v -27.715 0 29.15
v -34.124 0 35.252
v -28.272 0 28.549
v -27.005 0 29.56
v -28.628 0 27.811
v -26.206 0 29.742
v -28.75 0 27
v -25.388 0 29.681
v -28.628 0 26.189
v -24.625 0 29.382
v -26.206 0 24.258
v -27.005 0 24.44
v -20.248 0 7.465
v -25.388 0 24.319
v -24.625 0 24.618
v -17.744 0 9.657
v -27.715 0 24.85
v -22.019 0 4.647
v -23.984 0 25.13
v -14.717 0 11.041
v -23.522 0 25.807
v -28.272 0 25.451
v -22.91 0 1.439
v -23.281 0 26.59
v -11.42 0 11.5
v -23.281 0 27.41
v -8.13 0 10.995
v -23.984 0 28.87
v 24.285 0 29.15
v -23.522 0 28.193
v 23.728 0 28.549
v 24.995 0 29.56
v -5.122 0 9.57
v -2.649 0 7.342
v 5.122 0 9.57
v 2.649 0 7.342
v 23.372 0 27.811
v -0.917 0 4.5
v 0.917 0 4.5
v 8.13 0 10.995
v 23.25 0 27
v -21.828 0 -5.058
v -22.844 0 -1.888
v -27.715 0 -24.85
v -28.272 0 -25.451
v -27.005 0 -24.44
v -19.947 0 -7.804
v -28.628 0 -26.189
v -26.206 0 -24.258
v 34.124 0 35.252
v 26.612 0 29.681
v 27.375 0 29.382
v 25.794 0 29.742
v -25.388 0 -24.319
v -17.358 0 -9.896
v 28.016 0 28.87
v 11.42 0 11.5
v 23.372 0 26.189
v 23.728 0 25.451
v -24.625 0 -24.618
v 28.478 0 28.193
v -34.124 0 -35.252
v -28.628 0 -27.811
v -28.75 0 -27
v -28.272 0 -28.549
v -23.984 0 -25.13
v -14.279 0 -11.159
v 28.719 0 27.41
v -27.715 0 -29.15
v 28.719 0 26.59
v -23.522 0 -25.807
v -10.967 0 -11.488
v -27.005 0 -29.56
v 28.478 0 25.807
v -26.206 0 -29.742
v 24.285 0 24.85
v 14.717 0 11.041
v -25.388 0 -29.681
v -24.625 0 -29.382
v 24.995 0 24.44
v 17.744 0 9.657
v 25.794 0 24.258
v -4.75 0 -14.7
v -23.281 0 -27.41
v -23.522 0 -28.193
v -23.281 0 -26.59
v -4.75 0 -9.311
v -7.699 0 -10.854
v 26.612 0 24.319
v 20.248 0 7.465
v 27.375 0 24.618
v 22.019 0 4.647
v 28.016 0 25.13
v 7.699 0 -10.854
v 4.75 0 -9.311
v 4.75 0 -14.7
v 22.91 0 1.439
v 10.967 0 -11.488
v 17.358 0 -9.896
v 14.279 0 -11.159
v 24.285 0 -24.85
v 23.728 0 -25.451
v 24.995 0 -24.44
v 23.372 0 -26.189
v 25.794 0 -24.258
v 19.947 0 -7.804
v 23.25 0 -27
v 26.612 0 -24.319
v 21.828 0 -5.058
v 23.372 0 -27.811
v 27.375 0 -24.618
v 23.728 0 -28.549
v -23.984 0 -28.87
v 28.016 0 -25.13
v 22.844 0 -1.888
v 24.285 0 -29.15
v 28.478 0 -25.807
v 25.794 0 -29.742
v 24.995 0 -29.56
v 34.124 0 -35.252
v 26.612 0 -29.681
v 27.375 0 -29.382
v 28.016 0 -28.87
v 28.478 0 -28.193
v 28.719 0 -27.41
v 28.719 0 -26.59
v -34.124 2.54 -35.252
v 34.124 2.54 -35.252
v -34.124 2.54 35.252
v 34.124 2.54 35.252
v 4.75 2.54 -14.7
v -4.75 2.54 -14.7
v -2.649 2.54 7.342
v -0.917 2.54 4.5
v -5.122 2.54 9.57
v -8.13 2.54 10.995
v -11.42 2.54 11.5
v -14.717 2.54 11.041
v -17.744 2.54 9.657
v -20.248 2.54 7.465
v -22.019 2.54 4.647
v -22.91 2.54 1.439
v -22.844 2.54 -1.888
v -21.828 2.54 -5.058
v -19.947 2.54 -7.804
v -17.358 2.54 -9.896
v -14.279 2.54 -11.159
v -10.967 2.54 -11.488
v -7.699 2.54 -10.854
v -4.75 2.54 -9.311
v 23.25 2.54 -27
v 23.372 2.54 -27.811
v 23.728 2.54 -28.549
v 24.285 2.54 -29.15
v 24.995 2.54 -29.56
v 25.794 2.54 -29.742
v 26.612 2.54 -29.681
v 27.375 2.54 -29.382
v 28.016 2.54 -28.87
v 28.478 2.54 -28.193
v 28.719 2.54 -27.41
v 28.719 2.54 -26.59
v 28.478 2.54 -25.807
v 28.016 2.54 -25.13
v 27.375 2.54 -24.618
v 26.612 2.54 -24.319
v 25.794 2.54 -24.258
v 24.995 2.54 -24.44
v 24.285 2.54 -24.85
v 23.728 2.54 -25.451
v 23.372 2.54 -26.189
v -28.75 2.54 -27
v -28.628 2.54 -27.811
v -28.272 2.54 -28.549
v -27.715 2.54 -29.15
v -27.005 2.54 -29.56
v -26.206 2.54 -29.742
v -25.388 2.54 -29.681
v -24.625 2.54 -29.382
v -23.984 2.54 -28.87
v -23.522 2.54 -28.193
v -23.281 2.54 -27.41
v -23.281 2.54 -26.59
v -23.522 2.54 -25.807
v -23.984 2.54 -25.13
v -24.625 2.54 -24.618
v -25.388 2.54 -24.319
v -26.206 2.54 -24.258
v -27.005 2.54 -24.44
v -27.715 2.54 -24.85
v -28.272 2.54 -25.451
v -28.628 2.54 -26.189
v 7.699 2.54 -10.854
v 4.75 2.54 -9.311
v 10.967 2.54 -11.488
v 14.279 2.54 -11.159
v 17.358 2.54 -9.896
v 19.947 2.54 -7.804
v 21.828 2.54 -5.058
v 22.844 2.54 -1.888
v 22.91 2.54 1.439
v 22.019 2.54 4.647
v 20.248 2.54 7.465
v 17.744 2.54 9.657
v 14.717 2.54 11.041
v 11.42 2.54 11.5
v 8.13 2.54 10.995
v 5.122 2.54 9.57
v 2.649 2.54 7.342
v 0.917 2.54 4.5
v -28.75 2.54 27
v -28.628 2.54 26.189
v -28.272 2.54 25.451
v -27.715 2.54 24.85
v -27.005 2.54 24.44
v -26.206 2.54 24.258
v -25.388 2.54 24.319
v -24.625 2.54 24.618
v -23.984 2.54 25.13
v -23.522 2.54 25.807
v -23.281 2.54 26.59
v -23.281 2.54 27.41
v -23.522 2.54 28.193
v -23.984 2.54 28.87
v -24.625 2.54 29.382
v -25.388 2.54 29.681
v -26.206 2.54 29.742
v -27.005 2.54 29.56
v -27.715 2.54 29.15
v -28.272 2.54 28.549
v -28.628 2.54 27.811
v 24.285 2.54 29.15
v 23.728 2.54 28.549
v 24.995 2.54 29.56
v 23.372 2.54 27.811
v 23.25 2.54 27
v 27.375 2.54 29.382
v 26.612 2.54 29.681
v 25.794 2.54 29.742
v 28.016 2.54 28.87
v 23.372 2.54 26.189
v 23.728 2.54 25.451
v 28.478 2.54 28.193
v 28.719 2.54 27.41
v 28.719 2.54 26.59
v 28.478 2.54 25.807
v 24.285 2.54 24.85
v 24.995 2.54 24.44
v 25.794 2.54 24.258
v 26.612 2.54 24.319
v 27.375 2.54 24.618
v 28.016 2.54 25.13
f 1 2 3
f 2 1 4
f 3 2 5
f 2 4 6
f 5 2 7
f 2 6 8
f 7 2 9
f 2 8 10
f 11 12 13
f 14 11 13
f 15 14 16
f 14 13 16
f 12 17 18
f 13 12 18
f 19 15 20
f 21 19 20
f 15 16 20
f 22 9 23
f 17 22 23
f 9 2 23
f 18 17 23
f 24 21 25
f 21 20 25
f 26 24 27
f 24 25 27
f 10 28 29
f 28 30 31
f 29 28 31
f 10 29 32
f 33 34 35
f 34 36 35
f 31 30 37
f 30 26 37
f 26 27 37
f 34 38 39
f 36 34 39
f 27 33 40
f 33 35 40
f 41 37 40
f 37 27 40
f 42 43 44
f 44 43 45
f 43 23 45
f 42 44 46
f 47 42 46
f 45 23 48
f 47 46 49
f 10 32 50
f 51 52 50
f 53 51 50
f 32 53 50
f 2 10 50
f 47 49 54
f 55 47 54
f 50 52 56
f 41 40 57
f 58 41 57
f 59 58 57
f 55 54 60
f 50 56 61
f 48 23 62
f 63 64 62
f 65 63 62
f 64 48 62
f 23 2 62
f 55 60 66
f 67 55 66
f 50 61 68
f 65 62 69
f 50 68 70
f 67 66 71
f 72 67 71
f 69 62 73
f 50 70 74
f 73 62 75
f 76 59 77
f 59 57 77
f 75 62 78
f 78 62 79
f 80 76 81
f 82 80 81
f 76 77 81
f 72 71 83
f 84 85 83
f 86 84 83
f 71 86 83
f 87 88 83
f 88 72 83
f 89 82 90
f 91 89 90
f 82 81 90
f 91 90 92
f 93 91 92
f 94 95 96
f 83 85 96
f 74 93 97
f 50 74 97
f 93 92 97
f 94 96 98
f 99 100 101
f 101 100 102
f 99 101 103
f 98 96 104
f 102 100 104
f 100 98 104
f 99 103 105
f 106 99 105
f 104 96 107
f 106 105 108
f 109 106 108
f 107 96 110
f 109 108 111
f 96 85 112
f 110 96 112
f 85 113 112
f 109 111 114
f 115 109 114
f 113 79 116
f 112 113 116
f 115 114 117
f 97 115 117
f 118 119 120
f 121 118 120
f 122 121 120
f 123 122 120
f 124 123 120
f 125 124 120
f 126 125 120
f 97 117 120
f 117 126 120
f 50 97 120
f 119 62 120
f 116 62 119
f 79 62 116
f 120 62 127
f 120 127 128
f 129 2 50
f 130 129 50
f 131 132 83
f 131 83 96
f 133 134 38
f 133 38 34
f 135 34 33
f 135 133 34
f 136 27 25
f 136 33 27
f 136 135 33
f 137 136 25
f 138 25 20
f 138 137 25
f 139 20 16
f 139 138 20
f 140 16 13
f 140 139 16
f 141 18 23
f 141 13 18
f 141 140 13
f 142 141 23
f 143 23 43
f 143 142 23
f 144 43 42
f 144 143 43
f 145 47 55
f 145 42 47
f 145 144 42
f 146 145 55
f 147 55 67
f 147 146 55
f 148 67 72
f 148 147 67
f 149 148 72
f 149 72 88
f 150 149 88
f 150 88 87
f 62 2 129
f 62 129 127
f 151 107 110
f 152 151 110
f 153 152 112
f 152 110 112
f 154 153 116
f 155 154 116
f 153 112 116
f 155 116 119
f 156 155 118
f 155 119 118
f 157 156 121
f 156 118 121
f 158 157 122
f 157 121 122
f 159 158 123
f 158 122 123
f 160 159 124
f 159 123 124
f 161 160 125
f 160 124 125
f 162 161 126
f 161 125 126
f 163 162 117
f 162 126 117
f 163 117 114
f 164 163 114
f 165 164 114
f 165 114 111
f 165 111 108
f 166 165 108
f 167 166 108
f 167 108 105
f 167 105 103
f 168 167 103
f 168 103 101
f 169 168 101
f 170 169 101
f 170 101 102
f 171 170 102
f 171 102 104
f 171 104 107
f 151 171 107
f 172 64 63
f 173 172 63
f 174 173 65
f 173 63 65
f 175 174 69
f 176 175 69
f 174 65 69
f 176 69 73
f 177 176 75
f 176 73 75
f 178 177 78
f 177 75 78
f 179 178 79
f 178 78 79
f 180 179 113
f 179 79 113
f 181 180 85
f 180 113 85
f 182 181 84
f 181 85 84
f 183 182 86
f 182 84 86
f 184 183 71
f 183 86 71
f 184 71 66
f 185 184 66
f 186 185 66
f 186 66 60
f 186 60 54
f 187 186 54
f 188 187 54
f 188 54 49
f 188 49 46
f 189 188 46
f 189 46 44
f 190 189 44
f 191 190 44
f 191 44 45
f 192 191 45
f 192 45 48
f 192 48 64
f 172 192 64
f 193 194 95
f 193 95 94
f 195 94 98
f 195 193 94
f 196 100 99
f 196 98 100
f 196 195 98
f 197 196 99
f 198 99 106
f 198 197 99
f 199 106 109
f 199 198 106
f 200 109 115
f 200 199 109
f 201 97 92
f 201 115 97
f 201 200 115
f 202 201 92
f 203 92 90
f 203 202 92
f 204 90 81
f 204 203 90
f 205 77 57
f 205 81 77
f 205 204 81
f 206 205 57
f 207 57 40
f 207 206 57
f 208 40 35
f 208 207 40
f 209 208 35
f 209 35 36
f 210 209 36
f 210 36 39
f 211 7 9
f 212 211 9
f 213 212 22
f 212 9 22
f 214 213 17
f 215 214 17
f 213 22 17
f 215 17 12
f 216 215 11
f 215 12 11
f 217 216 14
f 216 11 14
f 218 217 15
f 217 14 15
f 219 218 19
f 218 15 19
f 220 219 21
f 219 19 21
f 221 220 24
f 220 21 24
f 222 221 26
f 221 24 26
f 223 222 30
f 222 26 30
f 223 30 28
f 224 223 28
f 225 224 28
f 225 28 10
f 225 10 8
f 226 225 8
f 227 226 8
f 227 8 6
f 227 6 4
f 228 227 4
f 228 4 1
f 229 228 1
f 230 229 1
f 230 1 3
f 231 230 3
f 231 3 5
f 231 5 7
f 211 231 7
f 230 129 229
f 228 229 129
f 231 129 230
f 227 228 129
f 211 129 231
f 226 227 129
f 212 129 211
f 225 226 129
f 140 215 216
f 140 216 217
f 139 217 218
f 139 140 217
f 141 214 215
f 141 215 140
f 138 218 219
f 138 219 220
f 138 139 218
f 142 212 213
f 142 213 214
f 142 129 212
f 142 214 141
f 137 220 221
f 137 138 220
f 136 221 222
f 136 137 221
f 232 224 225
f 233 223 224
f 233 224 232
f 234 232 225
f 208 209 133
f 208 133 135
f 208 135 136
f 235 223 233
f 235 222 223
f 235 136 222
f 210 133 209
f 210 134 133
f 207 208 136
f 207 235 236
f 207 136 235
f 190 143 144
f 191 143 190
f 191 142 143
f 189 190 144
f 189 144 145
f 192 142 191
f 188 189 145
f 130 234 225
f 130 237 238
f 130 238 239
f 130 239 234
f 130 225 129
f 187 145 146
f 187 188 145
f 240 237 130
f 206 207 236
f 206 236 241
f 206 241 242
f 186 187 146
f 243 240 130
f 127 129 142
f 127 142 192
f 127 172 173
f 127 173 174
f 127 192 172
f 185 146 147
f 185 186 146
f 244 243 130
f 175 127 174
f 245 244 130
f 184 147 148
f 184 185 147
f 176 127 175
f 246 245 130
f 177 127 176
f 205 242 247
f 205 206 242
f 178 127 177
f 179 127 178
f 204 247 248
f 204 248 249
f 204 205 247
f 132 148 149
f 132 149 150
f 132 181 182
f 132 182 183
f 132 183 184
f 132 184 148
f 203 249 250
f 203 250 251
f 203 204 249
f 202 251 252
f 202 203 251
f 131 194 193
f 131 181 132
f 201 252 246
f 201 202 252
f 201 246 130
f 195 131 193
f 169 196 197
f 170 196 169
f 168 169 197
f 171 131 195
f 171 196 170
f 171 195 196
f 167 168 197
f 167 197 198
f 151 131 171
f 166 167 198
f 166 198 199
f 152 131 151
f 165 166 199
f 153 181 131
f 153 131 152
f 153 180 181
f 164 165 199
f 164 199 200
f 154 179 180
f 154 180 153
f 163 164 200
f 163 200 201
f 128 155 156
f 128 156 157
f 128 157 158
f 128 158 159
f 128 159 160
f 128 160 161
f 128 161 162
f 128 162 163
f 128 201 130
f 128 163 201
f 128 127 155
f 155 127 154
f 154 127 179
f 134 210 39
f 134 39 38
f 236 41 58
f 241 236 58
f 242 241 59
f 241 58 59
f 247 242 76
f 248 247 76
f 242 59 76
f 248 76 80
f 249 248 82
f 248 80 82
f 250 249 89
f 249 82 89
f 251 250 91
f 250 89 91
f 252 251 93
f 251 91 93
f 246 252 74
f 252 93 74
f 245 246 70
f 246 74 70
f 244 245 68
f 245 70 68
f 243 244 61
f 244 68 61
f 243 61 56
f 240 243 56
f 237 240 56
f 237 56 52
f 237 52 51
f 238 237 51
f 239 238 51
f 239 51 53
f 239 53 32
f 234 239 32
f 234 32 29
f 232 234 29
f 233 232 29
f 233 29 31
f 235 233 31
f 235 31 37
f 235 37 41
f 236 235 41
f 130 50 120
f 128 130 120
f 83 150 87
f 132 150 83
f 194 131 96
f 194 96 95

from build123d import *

# Parameters (mm, degrees)
SKETCH1_W            = 68.248659994
SKETCH1_H            = 70.504814042
BOSS_EXTRUDE1_DEPTH  = 2.54
M5_CLEARANCE_HOLE1_D = 5.5
CUT_EXTRUDE1_DEPTH   = 50.128949699


with BuildPart() as part:
    # Sketch1 → Boss-Extrude1 (new body)
    with BuildSketch(Plane(origin=(0, 0, 0), x_dir=(1, 0, 0), z_dir=(0, 1, 0))):
        Rectangle(SKETCH1_W, SKETCH1_H)
    extrude(amount=BOSS_EXTRUDE1_DEPTH)

    # M5 Clearance Hole1 (through all)
    with Locations(Plane(origin=(0, 2.54, 0), x_dir=(1, 0, 0), z_dir=(0, 1, 0))):
        with Locations((26, 27), (-26, 27), (-26, -27), (26, -27)):
            Hole(M5_CLEARANCE_HOLE1_D / 2)

    # Sketch2 → Cut-Extrude1 (cut, through all)
    with BuildSketch(Plane(origin=(0, 2.54, 0), x_dir=(1, 0, 0), z_dir=(0, 1, 0))):
        with BuildLine():
            Line((-4.75, 14.7), (4.75, 14.7))
            Line((4.75, 14.7), (4.75, 9.310612225))
            ThreePointArc((4.75, 9.310612225), (22.581133525, -3.075464159), (0.916994756, -4.5))
            Line((0.916994756, -4.5), (-0.916994756, -4.5))
            ThreePointArc((-0.916994756, -4.5), (-22.581133525, -3.075464159), (-4.75, 9.310612225))
            Line((-4.75, 9.310612225), (-4.75, 14.7))
        make_face()
    extrude(amount=-CUT_EXTRUDE1_DEPTH, mode=Mode.SUBTRACT)


solid = part.part
